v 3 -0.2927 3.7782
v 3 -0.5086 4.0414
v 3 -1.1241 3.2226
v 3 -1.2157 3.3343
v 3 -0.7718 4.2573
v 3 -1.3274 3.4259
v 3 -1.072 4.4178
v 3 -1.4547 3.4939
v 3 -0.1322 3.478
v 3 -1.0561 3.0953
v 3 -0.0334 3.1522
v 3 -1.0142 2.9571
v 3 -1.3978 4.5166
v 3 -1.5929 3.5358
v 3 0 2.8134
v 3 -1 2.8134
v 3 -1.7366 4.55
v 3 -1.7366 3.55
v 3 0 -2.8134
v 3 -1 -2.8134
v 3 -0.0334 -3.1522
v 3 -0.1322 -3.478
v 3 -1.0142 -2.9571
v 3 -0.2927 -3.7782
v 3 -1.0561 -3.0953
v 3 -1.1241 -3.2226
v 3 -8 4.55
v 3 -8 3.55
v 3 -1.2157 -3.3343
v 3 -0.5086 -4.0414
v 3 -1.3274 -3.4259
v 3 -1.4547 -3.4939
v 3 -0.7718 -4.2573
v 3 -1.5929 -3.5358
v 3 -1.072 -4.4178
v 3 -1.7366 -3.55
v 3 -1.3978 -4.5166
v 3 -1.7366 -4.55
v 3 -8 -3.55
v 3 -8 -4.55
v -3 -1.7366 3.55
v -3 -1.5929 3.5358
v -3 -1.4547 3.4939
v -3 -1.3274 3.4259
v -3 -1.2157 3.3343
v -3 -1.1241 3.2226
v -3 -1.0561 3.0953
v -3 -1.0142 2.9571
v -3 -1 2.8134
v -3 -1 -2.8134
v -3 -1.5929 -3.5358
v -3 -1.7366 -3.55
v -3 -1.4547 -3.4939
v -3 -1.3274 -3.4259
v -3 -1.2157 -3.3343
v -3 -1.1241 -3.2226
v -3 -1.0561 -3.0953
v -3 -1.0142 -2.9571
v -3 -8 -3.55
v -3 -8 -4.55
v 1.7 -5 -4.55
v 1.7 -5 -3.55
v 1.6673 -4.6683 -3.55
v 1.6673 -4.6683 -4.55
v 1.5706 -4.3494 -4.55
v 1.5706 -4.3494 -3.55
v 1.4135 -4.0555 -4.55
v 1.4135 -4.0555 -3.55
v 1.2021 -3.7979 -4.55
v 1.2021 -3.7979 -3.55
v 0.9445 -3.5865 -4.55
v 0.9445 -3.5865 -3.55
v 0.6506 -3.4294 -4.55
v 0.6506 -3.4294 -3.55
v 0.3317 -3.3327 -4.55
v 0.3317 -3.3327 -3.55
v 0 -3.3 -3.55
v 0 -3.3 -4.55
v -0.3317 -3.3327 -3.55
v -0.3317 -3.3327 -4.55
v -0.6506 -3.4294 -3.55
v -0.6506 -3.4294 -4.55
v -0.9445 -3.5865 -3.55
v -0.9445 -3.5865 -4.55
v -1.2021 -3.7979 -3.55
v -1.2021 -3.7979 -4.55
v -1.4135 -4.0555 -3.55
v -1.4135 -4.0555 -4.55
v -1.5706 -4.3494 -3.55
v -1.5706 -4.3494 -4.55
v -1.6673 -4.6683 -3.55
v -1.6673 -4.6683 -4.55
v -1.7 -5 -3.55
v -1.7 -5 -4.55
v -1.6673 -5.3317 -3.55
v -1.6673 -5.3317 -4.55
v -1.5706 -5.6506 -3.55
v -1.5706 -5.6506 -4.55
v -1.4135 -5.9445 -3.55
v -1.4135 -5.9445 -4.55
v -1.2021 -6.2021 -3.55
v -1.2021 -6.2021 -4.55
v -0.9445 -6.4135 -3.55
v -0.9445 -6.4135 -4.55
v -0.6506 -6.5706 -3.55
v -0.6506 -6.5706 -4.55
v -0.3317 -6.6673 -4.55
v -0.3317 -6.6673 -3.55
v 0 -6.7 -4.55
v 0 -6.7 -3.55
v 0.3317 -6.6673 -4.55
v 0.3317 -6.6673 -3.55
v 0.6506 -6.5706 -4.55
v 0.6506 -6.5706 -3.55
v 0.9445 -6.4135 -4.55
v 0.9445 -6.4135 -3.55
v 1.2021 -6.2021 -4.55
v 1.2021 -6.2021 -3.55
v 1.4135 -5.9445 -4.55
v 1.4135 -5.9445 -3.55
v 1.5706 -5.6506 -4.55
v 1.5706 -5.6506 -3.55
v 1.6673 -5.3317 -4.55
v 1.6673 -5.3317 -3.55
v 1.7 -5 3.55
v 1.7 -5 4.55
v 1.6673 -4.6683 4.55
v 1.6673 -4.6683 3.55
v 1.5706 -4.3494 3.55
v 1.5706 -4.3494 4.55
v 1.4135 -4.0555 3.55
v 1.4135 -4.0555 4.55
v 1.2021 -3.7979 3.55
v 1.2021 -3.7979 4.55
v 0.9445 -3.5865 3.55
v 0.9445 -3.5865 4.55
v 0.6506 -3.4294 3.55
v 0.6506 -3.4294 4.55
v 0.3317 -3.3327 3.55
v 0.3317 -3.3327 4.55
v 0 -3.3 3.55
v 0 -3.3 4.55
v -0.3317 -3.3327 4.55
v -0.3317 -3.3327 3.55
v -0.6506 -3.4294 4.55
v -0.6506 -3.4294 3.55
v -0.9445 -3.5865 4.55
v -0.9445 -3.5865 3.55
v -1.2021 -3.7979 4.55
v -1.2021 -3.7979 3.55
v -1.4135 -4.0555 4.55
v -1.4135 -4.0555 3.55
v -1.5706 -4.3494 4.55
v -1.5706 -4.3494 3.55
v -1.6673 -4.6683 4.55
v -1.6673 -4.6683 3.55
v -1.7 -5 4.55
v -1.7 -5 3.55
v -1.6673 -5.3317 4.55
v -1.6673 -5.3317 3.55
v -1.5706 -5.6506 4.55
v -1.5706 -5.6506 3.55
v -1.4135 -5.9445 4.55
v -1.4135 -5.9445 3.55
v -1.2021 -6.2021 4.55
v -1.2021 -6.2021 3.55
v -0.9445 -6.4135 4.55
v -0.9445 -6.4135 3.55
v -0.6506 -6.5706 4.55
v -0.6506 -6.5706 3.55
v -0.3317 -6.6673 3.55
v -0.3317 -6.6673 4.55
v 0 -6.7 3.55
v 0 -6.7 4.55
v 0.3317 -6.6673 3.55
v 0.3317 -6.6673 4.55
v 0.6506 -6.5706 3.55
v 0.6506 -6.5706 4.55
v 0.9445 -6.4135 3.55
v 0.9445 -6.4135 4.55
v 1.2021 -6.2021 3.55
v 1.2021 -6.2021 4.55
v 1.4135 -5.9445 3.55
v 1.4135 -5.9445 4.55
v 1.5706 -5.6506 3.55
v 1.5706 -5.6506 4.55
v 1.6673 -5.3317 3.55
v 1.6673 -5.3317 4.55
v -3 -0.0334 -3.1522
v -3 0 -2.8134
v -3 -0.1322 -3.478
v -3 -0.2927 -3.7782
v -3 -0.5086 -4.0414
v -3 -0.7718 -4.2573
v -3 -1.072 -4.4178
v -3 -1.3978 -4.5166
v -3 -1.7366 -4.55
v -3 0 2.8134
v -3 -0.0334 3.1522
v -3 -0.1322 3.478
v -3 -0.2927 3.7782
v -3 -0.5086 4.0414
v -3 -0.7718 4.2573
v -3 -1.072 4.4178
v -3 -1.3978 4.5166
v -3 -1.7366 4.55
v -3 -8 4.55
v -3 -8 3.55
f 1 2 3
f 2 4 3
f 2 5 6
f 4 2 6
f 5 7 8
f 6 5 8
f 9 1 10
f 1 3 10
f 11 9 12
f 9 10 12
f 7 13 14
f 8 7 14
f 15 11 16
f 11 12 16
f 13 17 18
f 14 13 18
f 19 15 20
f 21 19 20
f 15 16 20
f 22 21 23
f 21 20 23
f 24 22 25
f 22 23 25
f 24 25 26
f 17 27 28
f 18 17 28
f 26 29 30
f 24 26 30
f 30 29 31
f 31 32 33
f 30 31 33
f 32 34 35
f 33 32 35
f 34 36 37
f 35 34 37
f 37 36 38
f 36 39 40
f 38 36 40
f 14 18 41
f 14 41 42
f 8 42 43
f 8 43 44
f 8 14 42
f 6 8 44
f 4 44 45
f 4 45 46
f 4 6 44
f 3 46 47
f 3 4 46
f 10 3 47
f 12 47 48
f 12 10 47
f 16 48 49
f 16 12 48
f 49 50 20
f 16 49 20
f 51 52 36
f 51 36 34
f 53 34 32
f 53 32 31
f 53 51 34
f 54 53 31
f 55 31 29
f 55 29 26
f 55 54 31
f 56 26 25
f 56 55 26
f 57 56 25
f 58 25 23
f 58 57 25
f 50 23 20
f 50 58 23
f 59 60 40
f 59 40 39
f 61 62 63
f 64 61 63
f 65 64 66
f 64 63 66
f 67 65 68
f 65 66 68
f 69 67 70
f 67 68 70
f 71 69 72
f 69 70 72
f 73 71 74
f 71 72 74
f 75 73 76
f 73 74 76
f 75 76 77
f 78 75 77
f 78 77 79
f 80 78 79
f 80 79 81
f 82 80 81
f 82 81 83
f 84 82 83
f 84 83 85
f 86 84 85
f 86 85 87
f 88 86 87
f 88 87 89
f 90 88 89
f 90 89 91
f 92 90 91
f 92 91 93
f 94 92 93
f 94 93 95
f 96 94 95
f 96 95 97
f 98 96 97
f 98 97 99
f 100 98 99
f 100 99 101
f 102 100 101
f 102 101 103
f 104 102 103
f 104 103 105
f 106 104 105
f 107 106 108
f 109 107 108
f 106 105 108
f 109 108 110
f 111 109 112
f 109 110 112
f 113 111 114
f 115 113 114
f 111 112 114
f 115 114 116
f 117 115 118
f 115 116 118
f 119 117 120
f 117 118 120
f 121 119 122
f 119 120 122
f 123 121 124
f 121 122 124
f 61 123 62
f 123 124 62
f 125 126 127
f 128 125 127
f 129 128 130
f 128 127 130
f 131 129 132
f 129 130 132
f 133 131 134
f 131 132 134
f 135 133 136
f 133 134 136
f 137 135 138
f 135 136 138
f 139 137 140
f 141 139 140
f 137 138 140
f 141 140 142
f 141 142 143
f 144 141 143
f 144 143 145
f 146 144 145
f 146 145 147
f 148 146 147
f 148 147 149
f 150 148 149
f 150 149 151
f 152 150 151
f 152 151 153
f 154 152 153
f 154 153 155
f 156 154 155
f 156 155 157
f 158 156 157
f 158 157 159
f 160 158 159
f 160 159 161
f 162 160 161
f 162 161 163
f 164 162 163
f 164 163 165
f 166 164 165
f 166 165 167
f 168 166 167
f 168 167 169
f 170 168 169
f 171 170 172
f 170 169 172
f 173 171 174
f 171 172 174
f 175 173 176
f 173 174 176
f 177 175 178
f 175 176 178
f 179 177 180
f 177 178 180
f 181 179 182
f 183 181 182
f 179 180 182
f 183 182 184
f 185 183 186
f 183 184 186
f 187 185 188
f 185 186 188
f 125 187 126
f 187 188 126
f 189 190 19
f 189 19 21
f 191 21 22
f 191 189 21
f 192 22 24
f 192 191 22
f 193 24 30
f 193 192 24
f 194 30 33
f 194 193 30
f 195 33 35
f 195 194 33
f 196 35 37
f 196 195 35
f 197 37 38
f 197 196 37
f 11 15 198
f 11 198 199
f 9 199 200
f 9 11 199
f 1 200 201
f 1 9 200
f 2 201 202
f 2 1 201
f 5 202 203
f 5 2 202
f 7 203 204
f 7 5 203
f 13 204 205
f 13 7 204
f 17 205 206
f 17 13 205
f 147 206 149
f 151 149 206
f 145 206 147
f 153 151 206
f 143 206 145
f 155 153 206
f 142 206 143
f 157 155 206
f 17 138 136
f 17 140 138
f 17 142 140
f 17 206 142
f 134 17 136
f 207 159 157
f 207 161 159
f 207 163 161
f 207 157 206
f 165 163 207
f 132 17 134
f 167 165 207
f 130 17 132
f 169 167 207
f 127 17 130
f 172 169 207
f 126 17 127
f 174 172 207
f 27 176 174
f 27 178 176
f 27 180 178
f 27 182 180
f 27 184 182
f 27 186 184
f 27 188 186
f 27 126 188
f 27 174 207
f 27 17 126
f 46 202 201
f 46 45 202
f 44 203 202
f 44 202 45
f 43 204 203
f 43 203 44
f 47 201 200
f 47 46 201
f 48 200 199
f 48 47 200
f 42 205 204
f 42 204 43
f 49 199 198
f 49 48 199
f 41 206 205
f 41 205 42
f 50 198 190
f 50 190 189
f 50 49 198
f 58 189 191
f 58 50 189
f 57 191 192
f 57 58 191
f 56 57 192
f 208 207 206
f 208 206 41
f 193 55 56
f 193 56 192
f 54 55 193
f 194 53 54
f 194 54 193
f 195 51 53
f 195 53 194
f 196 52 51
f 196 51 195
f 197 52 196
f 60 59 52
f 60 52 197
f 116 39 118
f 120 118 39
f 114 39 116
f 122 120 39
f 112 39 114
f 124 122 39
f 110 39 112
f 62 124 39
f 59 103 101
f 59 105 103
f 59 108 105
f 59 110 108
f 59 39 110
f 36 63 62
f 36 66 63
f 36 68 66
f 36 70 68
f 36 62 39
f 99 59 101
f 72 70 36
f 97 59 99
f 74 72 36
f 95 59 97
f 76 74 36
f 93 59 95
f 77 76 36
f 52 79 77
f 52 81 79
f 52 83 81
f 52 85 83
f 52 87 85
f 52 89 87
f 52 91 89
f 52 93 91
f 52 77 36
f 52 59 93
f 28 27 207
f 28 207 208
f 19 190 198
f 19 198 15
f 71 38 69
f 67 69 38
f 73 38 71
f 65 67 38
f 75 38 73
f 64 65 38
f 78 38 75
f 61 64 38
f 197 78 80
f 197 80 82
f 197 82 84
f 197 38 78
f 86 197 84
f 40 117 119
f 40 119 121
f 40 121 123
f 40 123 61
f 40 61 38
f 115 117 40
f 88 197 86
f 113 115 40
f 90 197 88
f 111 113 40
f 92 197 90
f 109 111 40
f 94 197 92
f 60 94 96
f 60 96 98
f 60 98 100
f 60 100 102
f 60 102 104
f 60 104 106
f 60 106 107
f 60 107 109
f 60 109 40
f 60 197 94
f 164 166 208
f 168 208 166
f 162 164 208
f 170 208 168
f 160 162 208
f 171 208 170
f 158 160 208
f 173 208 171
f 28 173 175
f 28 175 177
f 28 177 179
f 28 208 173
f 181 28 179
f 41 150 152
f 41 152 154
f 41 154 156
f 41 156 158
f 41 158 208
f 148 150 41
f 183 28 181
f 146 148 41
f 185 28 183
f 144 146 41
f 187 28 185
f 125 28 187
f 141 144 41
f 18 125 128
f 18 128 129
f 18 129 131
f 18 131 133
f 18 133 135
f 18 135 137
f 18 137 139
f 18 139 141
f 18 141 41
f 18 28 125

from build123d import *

# Parameters (mm, degrees)
ESQUISSE1_W                             = 6
ESQUISSE1_H                             = 7.1
T_LE_DE_BASE_PLI_E1_DEPTH               = 1
T_LE_PLI_E_SUR_AR_TE1_STRIP_W           = 5.4732
T_LE_PLI_E_SUR_AR_TE1_STRIP_H           = 1
T_LE_PLI_E_SUR_AR_TE1_STRIP_CUT_DEPTH   = 6
T_LE_PLI_E_SUR_AR_TE1_STRIP_2_W         = 5.4732
T_LE_PLI_E_SUR_AR_TE1_STRIP_2_H         = 1
T_LE_PLI_E_SUR_AR_TE1_STRIP_CUT_2_DEPTH = 6
T_LE_PLI_E_SUR_AR_TE1_DEPTH             = 6
T_LE_PLI_E_SUR_AR_TE1_BEND_DEPTH        = 6
ESQUISSE12_R                            = 1.7
ENL_V_MAT_EXTRU_1_DEPTH                 = 13.482387592


# Sheet-metal steps are written as plain solids
with BuildPart() as part:
    # Esquisse1 → Tôle de base pliée1 (new body)
    with BuildSketch(Plane(origin=(0, 0, 0), x_dir=(1, 0, 0), z_dir=(0, 1, 0))):
        Rectangle(ESQUISSE1_W, ESQUISSE1_H)
    extrude(amount=-T_LE_DE_BASE_PLI_E1_DEPTH)

    # Tôle pliée sur arête1 strip (across the edge) → Tôle pliée sur arête1 strip cut (cut)
    with BuildSketch(Plane(origin=(3, -1, 3.55), x_dir=(0, 0, -1), z_dir=(-1, 0, 0))):
        with Locations((-2, -0.5)):
            Rectangle(T_LE_PLI_E_SUR_AR_TE1_STRIP_W, T_LE_PLI_E_SUR_AR_TE1_STRIP_H)
    extrude(amount=T_LE_PLI_E_SUR_AR_TE1_STRIP_CUT_DEPTH, mode=Mode.SUBTRACT)

    # Tôle pliée sur arête1 strip 2 (across the edge) → Tôle pliée sur arête1 strip cut 2 (cut)
    with BuildSketch(Plane(origin=(-3, -1, -3.55), x_dir=(0, 0, 1), z_dir=(1, 0, 0))):
        with Locations((-2, -0.5)):
            Rectangle(T_LE_PLI_E_SUR_AR_TE1_STRIP_2_W, T_LE_PLI_E_SUR_AR_TE1_STRIP_2_H)
    extrude(amount=T_LE_PLI_E_SUR_AR_TE1_STRIP_CUT_2_DEPTH, mode=Mode.SUBTRACT)

    # Tôle pliée sur arête1 section (across the edge) → Tôle pliée sur arête1 (add)
    with BuildSketch(Plane(origin=(3, -1, 3.55), x_dir=(0, 0, -1), z_dir=(-1, 0, 0))):
        with BuildLine():
            Line((-1, 0.7366), (-1, 7))
            Line((-1, 7), (0, 7))
            Line((0, 7), (0, 0.7366))
            ThreePointArc((0, 0.7366), (0.215745145, 0.215745145), (0.7366, 0))
            Line((0.7366, 0), (0.7366, -1))
            ThreePointArc((0.7366, -1), (-0.491361636, -0.491361636), (-1, 0.7366))
        make_face()
    extrude(amount=T_LE_PLI_E_SUR_AR_TE1_DEPTH)

    # Tôle pliée sur arête1 section 2 (across the edge) → Tôle pliée sur arête1 bend (add)
    with BuildSketch(Plane(origin=(-3, -1, -3.55), x_dir=(0, 0, 1), z_dir=(1, 0, 0))):
        with BuildLine():
            Line((-1, 0.7366), (-1, 7))
            Line((-1, 7), (0, 7))
            Line((0, 7), (0, 0.7366))
            ThreePointArc((0, 0.7366), (0.215745145, 0.215745145), (0.7366, 0))
            Line((0.7366, 0), (0.7366, -1))
            ThreePointArc((0.7366, -1), (-0.491361636, -0.491361636), (-1, 0.7366))
        make_face()
    extrude(amount=T_LE_PLI_E_SUR_AR_TE1_BEND_DEPTH)

    # Esquisse12 → Enlèv. mat.-Extru.1 (cut, through all)
    with BuildSketch(Plane.XY.offset(4.55)):
        with Locations((0, -5)):
            Circle(ESQUISSE12_R)
    extrude(amount=-ENL_V_MAT_EXTRU_1_DEPTH, mode=Mode.SUBTRACT)


solid = part.part
